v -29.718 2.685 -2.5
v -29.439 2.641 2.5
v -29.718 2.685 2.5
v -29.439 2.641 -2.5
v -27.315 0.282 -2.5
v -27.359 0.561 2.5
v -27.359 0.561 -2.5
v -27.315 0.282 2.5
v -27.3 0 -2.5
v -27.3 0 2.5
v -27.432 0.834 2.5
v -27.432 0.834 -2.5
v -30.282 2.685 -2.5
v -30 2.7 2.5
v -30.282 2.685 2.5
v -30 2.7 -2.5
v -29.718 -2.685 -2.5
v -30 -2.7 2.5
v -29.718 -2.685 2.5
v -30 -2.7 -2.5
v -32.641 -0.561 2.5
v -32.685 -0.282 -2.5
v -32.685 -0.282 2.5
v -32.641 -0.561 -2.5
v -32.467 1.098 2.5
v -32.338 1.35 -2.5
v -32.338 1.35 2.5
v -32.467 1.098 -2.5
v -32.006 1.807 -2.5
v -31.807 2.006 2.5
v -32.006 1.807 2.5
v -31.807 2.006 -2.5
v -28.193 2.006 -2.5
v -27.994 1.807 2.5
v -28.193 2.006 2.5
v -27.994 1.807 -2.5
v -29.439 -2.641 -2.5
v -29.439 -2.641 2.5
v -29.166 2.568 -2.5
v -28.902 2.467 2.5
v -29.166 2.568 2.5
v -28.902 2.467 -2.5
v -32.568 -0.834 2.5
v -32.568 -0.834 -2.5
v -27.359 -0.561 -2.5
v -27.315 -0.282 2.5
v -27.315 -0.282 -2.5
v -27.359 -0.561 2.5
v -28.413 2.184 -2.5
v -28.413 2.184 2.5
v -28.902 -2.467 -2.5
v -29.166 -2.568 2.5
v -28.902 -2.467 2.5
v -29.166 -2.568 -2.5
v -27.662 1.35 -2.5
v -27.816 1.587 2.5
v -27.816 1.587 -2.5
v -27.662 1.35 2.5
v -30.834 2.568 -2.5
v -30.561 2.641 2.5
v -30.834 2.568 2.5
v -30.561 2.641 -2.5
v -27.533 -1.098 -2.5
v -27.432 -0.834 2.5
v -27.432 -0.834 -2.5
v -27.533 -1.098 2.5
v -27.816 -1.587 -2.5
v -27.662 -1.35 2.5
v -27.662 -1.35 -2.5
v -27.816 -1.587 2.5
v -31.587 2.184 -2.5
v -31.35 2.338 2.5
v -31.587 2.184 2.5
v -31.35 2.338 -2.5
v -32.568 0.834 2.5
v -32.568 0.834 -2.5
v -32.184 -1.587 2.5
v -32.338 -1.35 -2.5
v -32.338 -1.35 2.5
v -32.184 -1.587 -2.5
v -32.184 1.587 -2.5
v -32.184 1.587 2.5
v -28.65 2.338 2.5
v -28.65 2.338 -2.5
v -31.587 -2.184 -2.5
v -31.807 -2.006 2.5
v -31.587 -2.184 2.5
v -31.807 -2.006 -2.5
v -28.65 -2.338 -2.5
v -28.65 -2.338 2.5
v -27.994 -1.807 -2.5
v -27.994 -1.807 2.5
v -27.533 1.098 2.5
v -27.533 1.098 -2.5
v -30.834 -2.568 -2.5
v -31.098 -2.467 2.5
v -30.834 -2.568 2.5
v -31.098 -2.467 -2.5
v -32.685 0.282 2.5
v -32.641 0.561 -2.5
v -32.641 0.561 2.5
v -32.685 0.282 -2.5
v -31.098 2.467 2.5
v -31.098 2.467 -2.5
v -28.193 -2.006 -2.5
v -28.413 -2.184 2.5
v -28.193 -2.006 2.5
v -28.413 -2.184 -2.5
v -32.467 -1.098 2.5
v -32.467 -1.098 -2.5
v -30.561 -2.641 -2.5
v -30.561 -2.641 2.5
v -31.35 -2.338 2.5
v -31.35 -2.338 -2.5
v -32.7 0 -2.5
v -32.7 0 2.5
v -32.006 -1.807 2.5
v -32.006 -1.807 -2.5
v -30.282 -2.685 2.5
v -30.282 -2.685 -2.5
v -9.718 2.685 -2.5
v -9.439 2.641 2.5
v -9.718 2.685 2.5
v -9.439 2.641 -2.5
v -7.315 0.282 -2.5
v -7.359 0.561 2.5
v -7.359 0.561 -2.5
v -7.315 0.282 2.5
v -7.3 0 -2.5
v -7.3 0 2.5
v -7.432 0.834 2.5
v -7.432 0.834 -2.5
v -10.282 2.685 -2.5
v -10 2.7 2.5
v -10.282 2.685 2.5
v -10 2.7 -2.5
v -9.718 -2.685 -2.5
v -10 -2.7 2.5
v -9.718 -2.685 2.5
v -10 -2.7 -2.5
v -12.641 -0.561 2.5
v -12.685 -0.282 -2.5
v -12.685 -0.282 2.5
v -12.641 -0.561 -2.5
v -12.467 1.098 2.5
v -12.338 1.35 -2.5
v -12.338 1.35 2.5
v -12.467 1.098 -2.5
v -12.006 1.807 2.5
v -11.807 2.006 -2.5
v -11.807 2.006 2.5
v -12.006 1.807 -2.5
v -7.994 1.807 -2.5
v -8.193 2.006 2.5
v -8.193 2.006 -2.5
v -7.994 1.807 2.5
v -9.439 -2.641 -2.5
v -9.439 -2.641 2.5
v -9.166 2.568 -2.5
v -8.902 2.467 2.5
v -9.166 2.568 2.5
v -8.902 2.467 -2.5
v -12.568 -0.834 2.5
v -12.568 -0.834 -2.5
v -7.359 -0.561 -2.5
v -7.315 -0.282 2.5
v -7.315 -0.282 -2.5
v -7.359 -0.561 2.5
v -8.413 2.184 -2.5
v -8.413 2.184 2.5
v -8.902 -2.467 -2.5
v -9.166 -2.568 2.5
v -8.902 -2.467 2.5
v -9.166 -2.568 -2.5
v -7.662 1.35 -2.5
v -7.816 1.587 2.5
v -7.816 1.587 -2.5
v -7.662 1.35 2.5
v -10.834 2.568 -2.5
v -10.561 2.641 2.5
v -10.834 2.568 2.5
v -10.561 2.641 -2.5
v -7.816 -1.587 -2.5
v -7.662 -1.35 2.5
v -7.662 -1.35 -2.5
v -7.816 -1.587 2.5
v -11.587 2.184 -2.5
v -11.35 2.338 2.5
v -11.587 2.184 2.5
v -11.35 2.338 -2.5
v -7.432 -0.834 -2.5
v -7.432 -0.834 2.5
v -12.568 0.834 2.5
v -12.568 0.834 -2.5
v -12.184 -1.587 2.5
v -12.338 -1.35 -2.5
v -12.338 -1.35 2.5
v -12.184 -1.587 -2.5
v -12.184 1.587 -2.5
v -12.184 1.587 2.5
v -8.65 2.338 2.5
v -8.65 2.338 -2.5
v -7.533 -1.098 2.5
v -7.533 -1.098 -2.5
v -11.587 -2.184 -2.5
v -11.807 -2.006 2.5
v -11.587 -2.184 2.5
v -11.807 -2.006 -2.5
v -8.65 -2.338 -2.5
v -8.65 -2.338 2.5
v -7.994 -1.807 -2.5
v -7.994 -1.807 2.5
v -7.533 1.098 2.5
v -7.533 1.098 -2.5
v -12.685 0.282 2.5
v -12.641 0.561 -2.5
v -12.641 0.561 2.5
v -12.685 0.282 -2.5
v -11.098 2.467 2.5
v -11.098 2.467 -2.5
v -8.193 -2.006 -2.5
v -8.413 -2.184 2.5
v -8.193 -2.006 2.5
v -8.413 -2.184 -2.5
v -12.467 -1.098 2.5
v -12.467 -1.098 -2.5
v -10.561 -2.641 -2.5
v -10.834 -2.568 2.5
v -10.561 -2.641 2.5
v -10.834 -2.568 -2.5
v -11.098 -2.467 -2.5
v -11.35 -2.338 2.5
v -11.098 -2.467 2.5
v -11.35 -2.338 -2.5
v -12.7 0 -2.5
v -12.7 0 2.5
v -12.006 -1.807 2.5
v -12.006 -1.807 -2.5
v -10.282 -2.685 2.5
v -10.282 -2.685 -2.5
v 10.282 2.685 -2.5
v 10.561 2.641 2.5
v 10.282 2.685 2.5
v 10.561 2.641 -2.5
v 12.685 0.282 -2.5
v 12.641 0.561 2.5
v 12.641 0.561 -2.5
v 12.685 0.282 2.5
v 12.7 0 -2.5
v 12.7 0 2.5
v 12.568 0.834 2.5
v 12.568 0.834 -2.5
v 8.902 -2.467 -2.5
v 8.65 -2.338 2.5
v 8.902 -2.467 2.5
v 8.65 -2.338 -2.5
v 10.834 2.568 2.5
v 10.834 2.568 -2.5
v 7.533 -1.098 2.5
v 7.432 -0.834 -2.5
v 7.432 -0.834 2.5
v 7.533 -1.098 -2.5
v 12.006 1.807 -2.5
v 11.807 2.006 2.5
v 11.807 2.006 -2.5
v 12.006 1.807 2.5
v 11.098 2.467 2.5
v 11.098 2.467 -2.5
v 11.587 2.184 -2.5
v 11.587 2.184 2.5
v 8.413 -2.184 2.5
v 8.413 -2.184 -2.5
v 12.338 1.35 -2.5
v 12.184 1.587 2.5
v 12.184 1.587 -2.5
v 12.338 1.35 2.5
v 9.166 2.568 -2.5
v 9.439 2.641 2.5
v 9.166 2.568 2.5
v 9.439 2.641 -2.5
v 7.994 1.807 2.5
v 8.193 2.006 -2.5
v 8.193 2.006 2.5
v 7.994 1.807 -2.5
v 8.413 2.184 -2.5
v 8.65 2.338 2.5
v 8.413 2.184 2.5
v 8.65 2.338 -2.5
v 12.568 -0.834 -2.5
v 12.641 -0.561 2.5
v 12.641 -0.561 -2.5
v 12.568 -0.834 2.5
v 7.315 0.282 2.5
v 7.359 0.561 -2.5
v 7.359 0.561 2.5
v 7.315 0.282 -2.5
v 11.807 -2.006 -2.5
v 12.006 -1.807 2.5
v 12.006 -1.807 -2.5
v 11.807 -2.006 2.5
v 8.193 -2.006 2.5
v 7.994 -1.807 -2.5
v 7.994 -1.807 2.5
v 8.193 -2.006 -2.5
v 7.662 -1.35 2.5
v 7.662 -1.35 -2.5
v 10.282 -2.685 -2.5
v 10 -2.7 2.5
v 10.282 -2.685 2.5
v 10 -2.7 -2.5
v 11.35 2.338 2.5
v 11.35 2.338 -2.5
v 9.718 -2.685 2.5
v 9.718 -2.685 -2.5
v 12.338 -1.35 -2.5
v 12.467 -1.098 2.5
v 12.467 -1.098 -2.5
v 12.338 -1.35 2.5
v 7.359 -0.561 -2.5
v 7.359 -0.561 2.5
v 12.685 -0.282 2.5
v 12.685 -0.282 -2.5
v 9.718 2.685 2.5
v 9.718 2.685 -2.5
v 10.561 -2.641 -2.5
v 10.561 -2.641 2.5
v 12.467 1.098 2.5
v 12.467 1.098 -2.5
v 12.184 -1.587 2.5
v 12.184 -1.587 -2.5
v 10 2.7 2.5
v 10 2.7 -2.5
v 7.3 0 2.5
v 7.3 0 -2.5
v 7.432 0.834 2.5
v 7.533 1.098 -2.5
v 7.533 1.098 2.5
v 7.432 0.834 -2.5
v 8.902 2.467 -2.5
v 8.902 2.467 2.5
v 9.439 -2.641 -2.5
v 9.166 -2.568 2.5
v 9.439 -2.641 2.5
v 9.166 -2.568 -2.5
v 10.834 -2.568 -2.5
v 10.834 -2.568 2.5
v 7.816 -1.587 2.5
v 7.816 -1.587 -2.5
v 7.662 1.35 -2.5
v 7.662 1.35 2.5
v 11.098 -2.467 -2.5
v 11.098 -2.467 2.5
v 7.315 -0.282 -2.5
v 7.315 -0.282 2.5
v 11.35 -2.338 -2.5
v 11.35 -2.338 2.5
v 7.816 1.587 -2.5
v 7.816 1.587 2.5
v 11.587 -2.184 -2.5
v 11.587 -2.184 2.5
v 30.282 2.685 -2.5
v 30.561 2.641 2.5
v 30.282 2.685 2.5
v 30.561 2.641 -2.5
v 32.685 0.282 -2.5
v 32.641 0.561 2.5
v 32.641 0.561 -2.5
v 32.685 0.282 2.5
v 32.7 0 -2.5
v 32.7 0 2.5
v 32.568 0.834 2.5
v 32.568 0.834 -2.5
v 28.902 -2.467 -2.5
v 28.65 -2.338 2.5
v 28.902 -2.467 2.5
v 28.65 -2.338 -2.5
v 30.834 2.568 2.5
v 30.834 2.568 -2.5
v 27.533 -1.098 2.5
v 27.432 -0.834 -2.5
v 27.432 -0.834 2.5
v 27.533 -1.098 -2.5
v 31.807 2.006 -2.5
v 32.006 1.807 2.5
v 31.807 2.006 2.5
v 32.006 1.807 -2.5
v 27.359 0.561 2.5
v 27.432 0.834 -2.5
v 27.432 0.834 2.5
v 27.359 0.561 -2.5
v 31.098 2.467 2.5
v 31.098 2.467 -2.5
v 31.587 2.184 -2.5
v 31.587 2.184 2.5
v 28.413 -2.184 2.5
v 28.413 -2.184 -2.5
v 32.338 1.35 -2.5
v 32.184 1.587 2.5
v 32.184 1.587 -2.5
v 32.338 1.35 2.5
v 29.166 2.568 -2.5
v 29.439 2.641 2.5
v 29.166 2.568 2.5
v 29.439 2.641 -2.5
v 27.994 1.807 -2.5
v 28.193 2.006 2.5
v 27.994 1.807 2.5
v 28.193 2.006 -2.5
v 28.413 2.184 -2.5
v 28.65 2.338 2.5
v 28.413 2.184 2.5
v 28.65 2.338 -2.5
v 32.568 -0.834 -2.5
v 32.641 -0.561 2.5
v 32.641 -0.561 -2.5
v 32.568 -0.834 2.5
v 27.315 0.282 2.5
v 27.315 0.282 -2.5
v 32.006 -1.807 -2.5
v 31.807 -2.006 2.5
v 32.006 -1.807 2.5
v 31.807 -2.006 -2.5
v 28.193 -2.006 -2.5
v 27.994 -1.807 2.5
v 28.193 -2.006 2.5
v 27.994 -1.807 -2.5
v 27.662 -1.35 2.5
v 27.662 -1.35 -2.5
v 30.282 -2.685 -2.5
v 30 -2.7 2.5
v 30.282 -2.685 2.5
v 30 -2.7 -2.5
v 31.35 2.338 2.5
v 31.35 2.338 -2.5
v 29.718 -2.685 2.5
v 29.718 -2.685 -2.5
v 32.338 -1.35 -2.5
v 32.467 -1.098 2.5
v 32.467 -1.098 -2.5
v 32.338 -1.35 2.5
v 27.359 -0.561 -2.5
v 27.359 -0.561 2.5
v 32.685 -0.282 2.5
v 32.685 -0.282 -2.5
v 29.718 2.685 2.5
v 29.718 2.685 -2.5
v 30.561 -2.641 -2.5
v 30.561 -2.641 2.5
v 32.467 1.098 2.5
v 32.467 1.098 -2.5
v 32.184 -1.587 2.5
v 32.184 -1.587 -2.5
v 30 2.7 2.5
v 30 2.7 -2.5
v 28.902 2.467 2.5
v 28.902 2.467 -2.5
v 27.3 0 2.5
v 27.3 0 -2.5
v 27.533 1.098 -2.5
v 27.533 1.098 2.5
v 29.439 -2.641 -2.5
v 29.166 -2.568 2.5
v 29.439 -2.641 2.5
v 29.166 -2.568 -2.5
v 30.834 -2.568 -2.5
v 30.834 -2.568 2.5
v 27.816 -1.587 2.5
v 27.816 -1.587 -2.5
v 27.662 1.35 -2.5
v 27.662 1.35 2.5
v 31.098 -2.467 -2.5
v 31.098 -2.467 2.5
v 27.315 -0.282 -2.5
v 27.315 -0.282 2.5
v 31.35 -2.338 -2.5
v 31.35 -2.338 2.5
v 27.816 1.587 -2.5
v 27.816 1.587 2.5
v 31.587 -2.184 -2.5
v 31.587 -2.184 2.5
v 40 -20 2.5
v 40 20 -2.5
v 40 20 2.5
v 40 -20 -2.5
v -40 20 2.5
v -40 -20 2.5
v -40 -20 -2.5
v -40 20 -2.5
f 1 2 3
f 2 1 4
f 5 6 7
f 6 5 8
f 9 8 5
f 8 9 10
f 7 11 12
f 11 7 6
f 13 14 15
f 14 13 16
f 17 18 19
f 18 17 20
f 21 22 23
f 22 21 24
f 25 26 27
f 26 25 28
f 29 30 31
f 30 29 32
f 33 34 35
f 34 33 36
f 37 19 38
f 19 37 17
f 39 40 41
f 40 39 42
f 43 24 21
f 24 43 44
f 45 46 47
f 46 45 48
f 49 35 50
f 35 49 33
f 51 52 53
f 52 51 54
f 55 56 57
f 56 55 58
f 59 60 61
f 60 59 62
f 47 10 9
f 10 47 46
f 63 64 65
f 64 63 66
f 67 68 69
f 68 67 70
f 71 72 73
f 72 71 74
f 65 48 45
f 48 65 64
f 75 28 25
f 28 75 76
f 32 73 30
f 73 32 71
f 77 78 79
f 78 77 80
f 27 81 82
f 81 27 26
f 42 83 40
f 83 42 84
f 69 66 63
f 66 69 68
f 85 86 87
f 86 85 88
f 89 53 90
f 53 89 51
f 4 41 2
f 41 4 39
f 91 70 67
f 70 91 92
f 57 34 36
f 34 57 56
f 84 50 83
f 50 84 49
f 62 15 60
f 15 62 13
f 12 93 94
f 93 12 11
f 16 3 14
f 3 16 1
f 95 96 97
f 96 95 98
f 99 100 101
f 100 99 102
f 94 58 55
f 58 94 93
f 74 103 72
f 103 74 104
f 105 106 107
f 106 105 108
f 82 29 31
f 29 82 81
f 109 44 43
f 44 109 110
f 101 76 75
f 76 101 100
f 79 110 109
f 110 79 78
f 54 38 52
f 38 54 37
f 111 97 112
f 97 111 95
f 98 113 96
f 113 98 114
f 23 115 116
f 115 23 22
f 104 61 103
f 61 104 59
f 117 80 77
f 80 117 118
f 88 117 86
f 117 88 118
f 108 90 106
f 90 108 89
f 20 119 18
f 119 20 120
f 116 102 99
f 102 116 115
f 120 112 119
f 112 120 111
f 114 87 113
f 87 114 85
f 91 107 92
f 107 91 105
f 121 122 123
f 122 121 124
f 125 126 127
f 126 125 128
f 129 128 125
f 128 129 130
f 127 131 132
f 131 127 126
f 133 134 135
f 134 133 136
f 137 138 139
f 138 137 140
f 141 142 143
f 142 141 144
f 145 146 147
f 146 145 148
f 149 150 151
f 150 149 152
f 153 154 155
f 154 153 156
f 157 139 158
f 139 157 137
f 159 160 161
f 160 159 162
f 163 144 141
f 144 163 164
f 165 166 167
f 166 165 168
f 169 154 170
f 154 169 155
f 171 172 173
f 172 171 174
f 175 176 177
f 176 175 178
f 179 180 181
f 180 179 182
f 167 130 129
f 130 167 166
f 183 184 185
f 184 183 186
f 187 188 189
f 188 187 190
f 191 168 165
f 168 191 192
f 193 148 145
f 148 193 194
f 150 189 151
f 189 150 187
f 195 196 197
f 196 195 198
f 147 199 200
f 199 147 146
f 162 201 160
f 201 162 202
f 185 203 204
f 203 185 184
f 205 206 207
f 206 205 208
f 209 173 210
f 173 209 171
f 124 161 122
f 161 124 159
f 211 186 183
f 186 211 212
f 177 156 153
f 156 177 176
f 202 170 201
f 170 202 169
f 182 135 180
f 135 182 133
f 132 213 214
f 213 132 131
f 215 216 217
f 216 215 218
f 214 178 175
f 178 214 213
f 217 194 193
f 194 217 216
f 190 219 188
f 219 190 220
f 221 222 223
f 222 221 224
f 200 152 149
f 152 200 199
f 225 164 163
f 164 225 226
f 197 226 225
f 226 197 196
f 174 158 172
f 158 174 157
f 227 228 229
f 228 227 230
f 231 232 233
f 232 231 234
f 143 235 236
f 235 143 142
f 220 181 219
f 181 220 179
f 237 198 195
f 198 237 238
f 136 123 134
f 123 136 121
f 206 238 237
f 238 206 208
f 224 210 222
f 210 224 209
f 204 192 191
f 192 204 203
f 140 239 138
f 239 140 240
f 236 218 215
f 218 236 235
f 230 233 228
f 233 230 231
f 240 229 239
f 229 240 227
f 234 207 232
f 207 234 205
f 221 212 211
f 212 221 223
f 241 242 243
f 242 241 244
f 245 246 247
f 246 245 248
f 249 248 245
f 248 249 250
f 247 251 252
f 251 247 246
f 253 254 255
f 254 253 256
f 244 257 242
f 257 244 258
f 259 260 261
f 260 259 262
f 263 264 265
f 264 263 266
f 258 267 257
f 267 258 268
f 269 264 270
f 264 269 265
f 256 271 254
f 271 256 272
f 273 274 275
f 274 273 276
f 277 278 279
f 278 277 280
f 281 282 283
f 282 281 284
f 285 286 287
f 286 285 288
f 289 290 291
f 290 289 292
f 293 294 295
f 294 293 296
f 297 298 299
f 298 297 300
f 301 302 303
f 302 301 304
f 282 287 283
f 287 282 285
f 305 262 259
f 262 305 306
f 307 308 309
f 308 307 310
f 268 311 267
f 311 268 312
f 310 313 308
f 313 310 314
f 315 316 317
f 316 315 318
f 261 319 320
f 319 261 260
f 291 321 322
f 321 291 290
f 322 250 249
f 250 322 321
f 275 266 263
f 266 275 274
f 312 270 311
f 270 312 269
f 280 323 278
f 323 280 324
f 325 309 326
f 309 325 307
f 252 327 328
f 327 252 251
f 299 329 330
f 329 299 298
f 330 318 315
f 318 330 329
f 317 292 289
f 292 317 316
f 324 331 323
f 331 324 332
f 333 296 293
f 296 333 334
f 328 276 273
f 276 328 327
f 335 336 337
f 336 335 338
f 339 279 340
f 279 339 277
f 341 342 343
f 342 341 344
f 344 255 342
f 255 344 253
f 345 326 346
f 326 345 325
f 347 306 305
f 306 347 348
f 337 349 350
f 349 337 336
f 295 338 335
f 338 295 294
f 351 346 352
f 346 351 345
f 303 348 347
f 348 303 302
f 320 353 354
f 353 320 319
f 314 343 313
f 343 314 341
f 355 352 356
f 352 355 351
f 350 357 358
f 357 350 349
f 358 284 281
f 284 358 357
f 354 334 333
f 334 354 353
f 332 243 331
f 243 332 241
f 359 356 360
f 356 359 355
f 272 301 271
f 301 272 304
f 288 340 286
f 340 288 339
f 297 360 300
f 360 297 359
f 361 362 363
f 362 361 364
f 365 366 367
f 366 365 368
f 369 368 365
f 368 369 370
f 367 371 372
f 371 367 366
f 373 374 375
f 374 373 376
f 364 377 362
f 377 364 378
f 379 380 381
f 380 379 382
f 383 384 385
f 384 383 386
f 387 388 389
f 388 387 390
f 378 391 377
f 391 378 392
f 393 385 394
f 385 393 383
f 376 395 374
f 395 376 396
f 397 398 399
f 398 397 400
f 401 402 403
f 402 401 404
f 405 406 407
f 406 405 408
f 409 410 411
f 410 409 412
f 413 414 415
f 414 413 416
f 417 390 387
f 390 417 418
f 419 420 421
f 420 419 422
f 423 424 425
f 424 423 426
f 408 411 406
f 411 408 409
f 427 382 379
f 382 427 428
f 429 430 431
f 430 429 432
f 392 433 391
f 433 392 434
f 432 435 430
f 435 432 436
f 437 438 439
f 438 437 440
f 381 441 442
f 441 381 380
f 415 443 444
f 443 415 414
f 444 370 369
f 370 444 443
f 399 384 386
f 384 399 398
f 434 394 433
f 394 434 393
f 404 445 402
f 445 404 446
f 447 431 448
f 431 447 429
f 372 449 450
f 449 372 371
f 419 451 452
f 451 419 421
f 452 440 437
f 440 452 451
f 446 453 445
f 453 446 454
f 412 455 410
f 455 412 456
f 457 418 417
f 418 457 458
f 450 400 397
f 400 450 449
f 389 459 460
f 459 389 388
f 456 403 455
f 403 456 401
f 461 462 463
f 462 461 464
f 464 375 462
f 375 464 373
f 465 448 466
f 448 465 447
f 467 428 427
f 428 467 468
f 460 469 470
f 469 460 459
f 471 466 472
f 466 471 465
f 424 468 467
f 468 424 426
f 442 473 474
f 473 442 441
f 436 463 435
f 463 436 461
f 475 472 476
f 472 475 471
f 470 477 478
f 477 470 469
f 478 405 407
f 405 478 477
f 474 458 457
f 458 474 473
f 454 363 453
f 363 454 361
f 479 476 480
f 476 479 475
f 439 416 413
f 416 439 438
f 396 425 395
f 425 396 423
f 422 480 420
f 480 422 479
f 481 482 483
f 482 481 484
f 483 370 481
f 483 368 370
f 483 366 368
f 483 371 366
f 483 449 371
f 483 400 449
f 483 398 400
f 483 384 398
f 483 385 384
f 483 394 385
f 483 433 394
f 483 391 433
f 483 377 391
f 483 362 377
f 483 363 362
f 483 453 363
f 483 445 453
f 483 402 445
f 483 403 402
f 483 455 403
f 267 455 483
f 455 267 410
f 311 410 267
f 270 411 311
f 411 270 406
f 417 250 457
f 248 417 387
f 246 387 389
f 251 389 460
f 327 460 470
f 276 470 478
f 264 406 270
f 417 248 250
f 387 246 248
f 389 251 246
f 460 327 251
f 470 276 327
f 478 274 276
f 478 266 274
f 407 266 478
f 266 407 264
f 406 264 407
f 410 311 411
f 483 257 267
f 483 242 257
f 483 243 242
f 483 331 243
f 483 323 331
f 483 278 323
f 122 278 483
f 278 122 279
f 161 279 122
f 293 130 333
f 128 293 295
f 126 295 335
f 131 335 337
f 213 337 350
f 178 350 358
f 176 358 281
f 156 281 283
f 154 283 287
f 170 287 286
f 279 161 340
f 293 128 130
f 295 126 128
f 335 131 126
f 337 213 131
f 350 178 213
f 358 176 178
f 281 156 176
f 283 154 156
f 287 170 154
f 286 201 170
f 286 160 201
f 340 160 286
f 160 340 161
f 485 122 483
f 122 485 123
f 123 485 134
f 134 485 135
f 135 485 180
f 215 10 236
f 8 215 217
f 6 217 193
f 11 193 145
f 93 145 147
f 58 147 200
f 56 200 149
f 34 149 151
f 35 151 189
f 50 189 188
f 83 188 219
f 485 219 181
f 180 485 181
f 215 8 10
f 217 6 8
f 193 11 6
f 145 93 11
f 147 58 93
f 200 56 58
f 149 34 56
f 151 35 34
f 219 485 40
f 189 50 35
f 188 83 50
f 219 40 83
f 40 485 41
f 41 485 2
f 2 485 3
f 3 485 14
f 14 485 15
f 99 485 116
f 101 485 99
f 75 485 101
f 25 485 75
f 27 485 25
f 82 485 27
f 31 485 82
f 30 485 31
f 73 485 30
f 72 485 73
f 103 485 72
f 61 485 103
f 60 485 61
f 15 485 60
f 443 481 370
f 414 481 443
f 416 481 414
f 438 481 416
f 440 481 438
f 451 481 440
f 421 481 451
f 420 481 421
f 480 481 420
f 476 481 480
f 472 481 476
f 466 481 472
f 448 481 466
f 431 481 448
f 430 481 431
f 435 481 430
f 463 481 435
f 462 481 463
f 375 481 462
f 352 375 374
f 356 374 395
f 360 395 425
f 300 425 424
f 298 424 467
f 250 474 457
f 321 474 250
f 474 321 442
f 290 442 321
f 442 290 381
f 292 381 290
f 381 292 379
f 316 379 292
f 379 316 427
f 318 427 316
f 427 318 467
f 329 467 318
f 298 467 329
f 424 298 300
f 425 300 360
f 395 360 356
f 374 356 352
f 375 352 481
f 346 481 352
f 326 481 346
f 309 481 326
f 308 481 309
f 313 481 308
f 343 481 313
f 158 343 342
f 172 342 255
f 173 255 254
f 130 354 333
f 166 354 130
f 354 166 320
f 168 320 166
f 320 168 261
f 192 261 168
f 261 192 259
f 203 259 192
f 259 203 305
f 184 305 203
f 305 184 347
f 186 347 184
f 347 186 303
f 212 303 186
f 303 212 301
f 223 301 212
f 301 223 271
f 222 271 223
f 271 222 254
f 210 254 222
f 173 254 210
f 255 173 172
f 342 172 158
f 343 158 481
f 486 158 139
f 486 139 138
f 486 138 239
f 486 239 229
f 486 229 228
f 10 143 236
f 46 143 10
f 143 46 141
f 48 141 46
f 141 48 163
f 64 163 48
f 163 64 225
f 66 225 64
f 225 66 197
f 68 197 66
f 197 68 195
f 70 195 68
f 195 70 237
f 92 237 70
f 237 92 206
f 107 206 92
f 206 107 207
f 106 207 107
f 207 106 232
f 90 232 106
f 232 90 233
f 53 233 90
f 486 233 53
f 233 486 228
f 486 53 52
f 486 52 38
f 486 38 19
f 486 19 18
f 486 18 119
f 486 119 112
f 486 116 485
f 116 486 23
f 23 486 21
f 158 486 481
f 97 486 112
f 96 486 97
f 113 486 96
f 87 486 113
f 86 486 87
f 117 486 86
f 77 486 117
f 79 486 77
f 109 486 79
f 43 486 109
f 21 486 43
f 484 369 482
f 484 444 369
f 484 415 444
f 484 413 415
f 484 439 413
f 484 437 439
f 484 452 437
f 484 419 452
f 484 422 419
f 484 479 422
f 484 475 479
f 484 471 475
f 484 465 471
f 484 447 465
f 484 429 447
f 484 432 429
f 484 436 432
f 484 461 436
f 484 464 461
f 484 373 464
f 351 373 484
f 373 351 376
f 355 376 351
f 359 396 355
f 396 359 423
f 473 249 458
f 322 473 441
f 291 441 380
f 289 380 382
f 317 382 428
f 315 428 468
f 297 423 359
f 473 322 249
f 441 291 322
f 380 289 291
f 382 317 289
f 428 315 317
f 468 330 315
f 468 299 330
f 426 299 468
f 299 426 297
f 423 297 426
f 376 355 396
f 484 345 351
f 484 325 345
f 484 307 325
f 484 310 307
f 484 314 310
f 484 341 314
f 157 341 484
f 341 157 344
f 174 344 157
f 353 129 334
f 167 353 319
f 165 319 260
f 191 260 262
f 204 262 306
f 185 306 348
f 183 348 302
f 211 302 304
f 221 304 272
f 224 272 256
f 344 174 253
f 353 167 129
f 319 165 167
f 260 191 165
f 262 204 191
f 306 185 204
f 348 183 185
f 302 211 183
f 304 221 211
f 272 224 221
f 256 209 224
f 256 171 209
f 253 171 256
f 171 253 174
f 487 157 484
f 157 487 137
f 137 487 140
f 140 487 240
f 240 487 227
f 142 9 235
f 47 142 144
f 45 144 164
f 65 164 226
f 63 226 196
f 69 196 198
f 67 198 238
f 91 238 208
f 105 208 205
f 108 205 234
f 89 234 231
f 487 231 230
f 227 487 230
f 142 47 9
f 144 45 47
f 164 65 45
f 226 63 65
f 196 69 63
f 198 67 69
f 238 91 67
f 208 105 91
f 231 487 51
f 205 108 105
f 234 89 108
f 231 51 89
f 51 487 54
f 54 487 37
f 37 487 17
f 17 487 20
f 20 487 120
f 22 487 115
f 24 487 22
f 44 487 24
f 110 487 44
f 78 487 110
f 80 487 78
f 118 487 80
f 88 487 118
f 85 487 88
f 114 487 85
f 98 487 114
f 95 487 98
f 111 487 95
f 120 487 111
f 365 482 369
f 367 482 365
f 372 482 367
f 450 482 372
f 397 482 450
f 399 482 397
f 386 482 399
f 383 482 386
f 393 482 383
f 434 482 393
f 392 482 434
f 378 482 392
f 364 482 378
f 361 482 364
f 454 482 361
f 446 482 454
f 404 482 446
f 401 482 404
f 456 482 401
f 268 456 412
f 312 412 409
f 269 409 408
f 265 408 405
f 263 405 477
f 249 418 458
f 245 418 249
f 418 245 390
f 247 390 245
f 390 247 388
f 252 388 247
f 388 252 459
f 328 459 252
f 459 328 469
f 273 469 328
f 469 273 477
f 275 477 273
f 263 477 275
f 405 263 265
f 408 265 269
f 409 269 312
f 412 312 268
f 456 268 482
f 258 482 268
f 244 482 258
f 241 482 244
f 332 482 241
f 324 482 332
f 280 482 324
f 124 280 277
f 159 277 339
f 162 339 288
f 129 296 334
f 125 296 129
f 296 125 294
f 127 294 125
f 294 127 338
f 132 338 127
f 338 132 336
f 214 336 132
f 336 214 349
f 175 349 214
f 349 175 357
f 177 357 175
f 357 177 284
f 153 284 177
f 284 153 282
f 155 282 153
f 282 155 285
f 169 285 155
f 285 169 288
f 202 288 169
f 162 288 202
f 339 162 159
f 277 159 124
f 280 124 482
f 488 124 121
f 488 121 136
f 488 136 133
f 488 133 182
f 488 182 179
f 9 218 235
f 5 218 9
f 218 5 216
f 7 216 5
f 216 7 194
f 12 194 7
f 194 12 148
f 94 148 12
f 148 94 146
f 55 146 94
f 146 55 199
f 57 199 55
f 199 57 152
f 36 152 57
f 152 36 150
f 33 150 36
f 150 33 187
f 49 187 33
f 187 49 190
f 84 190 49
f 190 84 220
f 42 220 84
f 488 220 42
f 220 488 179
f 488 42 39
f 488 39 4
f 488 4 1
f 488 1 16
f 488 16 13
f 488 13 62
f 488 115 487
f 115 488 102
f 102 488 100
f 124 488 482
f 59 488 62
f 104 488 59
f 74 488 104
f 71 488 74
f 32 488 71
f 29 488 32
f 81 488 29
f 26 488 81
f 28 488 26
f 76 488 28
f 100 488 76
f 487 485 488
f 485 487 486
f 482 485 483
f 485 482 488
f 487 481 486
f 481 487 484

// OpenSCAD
// Multi-hole mounting plate.
$fn = 60;
eps = 0.02;
plate_l = 80;
plate_w = 40;
plate_t = 5;
hole_d = 5.4;
edge = 10;
difference() {
    cube([plate_l, plate_w, plate_t], center = true);
    for (i = [0 : 3])
        translate([-plate_l / 2 + edge + i * (plate_l - 2 * edge) / max(1, 3), 0, -plate_t / 2 - eps])
            cylinder(d = hole_d, h = plate_t + 2 * eps);
}
